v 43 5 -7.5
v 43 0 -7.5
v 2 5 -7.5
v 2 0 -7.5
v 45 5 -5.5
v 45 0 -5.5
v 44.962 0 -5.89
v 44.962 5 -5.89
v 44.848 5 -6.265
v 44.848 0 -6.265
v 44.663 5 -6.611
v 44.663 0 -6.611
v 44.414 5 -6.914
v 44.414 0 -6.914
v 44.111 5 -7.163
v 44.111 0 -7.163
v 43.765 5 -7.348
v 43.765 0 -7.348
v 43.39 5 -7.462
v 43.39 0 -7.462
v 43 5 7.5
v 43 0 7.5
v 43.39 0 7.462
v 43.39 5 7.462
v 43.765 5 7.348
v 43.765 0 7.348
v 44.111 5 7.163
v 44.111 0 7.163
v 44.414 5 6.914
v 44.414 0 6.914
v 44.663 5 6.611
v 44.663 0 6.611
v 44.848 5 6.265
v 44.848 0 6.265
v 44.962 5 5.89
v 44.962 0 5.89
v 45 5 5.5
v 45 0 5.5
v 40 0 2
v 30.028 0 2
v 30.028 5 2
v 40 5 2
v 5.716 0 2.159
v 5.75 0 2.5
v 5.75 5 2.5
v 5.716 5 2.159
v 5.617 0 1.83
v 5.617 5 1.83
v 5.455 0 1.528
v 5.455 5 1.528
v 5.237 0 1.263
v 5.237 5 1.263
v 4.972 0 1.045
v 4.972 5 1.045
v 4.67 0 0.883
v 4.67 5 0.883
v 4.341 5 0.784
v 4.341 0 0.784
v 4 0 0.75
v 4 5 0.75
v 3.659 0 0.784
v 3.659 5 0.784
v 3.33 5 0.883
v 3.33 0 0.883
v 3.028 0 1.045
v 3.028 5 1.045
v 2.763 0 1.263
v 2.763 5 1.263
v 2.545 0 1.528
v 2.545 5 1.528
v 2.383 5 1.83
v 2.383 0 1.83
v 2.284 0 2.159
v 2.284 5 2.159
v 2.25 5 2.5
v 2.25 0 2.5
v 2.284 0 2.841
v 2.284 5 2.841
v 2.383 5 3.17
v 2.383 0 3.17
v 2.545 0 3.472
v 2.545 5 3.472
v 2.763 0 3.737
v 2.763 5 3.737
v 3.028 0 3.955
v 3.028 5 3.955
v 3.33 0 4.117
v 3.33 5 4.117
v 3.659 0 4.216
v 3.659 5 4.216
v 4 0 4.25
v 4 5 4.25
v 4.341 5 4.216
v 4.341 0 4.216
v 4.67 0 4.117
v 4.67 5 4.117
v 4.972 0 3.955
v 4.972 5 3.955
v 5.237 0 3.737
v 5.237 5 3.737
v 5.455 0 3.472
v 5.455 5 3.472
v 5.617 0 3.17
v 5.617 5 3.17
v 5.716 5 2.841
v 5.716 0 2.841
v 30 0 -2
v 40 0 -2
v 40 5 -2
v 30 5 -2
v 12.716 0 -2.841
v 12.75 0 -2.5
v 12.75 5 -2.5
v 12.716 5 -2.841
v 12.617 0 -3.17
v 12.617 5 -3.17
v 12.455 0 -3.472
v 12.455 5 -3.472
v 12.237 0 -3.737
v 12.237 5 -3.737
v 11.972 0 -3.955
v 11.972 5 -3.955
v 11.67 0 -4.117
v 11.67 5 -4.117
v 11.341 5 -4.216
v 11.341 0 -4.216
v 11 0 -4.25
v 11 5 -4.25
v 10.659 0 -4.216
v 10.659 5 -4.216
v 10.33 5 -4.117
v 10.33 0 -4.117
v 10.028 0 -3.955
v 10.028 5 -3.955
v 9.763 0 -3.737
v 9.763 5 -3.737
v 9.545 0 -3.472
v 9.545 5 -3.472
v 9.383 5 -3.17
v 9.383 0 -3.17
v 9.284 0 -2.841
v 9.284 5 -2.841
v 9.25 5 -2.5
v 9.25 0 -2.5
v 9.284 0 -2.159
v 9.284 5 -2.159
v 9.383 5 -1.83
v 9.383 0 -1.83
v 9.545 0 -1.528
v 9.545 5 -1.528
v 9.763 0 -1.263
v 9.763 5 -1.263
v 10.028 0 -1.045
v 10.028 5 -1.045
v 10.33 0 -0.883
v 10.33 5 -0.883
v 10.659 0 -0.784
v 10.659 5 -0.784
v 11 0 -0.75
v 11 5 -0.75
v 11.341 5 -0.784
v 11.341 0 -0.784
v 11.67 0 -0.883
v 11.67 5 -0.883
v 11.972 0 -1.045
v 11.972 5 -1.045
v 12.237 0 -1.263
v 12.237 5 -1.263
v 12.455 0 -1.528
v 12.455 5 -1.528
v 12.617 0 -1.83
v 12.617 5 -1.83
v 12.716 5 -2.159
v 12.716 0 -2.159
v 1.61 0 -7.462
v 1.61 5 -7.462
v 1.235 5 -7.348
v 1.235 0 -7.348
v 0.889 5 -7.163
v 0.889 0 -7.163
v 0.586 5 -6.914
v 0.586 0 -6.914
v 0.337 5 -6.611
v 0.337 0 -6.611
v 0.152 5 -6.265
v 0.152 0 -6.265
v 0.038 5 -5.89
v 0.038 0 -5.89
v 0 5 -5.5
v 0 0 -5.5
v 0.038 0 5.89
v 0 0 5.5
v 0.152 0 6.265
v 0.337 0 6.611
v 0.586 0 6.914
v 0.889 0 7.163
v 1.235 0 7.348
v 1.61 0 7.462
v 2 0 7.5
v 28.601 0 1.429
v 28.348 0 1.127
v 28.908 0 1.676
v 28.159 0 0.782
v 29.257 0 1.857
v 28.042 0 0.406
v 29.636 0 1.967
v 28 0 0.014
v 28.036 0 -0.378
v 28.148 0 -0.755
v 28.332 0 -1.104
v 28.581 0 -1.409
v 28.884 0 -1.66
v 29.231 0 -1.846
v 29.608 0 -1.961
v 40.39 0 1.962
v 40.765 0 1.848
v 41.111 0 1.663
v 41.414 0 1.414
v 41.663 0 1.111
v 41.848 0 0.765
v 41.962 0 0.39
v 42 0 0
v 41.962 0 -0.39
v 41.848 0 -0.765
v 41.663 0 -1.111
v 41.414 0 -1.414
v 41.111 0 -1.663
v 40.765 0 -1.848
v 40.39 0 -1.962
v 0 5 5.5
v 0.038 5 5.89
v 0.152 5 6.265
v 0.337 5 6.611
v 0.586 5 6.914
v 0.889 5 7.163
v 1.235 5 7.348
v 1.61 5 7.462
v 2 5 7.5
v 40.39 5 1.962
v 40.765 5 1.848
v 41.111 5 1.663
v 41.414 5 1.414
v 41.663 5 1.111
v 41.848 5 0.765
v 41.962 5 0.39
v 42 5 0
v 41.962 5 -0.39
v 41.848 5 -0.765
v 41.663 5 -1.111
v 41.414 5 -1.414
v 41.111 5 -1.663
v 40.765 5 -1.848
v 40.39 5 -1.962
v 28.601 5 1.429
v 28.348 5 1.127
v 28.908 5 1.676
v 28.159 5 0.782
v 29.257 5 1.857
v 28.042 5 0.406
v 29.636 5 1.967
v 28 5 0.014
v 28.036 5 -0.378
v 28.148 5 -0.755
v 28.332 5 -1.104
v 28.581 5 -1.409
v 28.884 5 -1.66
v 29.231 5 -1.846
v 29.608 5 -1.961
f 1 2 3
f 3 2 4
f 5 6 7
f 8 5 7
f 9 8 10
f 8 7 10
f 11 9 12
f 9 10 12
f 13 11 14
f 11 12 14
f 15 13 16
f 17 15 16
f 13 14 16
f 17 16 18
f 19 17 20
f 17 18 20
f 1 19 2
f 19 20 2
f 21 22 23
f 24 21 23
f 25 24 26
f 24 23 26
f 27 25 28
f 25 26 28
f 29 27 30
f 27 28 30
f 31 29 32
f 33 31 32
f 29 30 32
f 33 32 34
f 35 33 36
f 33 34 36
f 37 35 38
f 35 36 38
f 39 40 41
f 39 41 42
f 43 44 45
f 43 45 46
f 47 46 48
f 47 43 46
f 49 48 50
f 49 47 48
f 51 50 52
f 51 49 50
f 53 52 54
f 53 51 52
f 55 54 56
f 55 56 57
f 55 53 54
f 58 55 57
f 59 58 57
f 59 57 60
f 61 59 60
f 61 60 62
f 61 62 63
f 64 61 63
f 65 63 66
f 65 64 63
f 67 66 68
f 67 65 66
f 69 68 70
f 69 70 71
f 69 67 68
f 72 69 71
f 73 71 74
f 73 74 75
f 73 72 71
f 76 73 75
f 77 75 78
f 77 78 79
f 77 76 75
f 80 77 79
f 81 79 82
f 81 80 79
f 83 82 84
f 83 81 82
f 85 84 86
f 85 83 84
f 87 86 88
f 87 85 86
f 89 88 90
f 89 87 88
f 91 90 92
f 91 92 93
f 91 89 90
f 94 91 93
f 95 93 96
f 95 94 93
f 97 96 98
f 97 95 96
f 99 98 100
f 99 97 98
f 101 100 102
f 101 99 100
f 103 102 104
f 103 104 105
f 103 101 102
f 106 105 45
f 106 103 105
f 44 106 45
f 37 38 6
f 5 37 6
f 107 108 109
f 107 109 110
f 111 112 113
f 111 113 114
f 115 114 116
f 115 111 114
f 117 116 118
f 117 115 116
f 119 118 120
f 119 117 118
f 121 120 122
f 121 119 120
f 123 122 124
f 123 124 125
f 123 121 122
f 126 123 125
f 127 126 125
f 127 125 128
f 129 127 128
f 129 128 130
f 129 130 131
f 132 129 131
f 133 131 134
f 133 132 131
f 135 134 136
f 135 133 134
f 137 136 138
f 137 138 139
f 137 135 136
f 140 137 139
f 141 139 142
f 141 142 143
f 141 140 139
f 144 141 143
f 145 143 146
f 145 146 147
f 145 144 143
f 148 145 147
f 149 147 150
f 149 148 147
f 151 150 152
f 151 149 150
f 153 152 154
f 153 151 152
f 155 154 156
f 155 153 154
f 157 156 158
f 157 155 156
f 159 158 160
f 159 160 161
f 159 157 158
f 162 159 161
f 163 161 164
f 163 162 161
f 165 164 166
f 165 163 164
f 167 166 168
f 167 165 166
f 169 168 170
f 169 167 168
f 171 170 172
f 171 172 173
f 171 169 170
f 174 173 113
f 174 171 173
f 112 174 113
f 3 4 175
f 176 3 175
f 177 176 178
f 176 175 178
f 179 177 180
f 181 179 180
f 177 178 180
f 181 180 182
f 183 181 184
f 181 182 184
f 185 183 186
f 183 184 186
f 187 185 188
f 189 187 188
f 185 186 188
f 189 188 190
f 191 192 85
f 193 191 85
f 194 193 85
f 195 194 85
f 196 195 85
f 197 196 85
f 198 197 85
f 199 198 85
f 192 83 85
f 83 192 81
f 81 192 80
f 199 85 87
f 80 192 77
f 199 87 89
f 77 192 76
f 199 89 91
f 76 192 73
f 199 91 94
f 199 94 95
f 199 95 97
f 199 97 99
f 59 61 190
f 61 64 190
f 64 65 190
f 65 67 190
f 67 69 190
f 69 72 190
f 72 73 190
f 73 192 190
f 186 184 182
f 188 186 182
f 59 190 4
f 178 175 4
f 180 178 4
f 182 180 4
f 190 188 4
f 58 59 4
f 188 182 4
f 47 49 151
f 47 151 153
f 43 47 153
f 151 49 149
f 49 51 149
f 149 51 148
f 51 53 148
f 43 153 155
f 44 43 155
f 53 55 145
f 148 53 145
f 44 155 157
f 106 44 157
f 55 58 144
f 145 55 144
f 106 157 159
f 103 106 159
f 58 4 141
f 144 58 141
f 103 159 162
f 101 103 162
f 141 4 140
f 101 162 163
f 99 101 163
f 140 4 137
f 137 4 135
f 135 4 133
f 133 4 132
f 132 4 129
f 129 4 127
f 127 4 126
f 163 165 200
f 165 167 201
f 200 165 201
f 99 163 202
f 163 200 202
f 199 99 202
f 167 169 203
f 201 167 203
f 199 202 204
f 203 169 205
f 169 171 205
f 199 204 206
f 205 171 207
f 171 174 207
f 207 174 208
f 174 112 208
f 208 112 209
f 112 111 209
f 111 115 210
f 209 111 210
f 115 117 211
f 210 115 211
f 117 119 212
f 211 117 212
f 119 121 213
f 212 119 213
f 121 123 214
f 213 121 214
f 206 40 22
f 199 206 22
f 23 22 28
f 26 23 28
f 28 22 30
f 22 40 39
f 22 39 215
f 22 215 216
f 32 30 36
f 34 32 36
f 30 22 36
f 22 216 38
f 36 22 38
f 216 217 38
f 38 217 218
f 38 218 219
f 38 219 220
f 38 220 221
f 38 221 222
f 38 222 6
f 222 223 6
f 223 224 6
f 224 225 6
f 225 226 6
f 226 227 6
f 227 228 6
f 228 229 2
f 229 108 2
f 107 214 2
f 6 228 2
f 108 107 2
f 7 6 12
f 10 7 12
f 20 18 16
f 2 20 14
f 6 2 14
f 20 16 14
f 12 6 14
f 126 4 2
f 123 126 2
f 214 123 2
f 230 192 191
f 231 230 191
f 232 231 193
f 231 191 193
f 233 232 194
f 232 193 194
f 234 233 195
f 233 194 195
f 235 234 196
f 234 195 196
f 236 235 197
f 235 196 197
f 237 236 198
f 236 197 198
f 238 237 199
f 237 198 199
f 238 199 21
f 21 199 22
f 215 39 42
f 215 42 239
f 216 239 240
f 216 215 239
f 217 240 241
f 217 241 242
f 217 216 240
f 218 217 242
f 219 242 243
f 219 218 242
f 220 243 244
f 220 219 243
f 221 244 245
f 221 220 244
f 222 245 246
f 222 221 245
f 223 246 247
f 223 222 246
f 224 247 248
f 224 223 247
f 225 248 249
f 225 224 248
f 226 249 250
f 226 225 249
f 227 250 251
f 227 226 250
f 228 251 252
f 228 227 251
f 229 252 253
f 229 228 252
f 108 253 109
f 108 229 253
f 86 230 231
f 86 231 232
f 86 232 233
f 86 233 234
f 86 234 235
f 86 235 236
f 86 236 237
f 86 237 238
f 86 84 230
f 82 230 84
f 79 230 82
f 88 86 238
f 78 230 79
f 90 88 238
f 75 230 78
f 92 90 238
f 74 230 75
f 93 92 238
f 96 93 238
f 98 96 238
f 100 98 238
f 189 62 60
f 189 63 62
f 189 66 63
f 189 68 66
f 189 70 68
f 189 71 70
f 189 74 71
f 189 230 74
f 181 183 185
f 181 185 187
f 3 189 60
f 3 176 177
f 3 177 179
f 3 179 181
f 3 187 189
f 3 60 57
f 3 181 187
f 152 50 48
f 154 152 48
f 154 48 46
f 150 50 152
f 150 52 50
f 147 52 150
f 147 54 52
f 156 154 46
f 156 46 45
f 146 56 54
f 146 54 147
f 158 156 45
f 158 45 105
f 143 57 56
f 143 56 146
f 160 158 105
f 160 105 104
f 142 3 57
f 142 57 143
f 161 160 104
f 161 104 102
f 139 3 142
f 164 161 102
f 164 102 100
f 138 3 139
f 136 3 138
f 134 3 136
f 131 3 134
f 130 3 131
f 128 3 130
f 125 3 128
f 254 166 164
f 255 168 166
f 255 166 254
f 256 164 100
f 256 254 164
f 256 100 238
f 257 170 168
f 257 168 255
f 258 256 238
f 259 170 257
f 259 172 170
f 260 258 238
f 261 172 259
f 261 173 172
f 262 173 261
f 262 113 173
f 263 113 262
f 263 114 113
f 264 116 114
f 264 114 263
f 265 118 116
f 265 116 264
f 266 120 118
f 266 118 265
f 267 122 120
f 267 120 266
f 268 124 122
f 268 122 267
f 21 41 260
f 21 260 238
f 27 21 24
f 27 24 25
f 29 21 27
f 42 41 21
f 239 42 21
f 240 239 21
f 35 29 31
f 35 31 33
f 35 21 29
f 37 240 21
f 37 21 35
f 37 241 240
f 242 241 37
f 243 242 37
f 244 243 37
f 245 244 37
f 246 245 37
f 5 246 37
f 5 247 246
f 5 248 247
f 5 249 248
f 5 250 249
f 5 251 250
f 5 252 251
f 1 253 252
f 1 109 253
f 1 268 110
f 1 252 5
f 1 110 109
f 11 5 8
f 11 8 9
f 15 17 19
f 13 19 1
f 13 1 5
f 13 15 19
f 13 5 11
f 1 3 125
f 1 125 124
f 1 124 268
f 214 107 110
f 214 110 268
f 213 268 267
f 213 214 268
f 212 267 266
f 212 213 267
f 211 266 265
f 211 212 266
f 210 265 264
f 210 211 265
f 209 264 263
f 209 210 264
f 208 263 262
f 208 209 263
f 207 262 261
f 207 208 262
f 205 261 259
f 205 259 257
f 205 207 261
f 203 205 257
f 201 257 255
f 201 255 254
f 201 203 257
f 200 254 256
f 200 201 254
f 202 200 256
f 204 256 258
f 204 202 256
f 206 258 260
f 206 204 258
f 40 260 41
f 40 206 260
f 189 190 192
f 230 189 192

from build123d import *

# Parameters (mm, degrees)
SKETCH_1_R      = 1.75
EXTRUDE_1_DEPTH = 5


with BuildPart() as part:
    # 草图1 → 凸台-拉伸1 (new body)
    with BuildSketch(Plane(origin=(0, 0, 0), x_dir=(1, 0, 0), z_dir=(0, 1, 0))):
        with BuildLine():
            Line((0, 5.5), (0, -5.5))
            ThreePointArc((0, -5.5), (0.585786438, -6.914213562), (2, -7.5))
            Line((2, -7.5), (43, -7.5))
            ThreePointArc((43, -7.5), (44.414213562, -6.914213562), (45, -5.5))
            Line((45, -5.5), (45, 5.5))
            ThreePointArc((45, 5.5), (44.414213562, 6.914213562), (43, 7.5))
            Line((43, 7.5), (2, 7.5))
            ThreePointArc((2, 7.5), (0.585786438, 6.914213562), (0, 5.5))
        make_face()
        with Locations((4, -2.5)):
            Circle(SKETCH_1_R, mode=Mode.SUBTRACT)
        with Locations((11, 2.5)):
            Circle(SKETCH_1_R, mode=Mode.SUBTRACT)
        with BuildLine():
            Line((30.028060952, -2), (40, -2))
            ThreePointArc((40, -2), (42, 3.9373e-05), (40, 2))
            Line((40, 2), (29.99998029, 1.999803136))
            ThreePointArc((29.99998029, 1.999803136), (28.000049288, -0.014237539), (30.028060952, -2))
        make_face(mode=Mode.SUBTRACT)
    extrude(amount=EXTRUDE_1_DEPTH)


solid = part.part
